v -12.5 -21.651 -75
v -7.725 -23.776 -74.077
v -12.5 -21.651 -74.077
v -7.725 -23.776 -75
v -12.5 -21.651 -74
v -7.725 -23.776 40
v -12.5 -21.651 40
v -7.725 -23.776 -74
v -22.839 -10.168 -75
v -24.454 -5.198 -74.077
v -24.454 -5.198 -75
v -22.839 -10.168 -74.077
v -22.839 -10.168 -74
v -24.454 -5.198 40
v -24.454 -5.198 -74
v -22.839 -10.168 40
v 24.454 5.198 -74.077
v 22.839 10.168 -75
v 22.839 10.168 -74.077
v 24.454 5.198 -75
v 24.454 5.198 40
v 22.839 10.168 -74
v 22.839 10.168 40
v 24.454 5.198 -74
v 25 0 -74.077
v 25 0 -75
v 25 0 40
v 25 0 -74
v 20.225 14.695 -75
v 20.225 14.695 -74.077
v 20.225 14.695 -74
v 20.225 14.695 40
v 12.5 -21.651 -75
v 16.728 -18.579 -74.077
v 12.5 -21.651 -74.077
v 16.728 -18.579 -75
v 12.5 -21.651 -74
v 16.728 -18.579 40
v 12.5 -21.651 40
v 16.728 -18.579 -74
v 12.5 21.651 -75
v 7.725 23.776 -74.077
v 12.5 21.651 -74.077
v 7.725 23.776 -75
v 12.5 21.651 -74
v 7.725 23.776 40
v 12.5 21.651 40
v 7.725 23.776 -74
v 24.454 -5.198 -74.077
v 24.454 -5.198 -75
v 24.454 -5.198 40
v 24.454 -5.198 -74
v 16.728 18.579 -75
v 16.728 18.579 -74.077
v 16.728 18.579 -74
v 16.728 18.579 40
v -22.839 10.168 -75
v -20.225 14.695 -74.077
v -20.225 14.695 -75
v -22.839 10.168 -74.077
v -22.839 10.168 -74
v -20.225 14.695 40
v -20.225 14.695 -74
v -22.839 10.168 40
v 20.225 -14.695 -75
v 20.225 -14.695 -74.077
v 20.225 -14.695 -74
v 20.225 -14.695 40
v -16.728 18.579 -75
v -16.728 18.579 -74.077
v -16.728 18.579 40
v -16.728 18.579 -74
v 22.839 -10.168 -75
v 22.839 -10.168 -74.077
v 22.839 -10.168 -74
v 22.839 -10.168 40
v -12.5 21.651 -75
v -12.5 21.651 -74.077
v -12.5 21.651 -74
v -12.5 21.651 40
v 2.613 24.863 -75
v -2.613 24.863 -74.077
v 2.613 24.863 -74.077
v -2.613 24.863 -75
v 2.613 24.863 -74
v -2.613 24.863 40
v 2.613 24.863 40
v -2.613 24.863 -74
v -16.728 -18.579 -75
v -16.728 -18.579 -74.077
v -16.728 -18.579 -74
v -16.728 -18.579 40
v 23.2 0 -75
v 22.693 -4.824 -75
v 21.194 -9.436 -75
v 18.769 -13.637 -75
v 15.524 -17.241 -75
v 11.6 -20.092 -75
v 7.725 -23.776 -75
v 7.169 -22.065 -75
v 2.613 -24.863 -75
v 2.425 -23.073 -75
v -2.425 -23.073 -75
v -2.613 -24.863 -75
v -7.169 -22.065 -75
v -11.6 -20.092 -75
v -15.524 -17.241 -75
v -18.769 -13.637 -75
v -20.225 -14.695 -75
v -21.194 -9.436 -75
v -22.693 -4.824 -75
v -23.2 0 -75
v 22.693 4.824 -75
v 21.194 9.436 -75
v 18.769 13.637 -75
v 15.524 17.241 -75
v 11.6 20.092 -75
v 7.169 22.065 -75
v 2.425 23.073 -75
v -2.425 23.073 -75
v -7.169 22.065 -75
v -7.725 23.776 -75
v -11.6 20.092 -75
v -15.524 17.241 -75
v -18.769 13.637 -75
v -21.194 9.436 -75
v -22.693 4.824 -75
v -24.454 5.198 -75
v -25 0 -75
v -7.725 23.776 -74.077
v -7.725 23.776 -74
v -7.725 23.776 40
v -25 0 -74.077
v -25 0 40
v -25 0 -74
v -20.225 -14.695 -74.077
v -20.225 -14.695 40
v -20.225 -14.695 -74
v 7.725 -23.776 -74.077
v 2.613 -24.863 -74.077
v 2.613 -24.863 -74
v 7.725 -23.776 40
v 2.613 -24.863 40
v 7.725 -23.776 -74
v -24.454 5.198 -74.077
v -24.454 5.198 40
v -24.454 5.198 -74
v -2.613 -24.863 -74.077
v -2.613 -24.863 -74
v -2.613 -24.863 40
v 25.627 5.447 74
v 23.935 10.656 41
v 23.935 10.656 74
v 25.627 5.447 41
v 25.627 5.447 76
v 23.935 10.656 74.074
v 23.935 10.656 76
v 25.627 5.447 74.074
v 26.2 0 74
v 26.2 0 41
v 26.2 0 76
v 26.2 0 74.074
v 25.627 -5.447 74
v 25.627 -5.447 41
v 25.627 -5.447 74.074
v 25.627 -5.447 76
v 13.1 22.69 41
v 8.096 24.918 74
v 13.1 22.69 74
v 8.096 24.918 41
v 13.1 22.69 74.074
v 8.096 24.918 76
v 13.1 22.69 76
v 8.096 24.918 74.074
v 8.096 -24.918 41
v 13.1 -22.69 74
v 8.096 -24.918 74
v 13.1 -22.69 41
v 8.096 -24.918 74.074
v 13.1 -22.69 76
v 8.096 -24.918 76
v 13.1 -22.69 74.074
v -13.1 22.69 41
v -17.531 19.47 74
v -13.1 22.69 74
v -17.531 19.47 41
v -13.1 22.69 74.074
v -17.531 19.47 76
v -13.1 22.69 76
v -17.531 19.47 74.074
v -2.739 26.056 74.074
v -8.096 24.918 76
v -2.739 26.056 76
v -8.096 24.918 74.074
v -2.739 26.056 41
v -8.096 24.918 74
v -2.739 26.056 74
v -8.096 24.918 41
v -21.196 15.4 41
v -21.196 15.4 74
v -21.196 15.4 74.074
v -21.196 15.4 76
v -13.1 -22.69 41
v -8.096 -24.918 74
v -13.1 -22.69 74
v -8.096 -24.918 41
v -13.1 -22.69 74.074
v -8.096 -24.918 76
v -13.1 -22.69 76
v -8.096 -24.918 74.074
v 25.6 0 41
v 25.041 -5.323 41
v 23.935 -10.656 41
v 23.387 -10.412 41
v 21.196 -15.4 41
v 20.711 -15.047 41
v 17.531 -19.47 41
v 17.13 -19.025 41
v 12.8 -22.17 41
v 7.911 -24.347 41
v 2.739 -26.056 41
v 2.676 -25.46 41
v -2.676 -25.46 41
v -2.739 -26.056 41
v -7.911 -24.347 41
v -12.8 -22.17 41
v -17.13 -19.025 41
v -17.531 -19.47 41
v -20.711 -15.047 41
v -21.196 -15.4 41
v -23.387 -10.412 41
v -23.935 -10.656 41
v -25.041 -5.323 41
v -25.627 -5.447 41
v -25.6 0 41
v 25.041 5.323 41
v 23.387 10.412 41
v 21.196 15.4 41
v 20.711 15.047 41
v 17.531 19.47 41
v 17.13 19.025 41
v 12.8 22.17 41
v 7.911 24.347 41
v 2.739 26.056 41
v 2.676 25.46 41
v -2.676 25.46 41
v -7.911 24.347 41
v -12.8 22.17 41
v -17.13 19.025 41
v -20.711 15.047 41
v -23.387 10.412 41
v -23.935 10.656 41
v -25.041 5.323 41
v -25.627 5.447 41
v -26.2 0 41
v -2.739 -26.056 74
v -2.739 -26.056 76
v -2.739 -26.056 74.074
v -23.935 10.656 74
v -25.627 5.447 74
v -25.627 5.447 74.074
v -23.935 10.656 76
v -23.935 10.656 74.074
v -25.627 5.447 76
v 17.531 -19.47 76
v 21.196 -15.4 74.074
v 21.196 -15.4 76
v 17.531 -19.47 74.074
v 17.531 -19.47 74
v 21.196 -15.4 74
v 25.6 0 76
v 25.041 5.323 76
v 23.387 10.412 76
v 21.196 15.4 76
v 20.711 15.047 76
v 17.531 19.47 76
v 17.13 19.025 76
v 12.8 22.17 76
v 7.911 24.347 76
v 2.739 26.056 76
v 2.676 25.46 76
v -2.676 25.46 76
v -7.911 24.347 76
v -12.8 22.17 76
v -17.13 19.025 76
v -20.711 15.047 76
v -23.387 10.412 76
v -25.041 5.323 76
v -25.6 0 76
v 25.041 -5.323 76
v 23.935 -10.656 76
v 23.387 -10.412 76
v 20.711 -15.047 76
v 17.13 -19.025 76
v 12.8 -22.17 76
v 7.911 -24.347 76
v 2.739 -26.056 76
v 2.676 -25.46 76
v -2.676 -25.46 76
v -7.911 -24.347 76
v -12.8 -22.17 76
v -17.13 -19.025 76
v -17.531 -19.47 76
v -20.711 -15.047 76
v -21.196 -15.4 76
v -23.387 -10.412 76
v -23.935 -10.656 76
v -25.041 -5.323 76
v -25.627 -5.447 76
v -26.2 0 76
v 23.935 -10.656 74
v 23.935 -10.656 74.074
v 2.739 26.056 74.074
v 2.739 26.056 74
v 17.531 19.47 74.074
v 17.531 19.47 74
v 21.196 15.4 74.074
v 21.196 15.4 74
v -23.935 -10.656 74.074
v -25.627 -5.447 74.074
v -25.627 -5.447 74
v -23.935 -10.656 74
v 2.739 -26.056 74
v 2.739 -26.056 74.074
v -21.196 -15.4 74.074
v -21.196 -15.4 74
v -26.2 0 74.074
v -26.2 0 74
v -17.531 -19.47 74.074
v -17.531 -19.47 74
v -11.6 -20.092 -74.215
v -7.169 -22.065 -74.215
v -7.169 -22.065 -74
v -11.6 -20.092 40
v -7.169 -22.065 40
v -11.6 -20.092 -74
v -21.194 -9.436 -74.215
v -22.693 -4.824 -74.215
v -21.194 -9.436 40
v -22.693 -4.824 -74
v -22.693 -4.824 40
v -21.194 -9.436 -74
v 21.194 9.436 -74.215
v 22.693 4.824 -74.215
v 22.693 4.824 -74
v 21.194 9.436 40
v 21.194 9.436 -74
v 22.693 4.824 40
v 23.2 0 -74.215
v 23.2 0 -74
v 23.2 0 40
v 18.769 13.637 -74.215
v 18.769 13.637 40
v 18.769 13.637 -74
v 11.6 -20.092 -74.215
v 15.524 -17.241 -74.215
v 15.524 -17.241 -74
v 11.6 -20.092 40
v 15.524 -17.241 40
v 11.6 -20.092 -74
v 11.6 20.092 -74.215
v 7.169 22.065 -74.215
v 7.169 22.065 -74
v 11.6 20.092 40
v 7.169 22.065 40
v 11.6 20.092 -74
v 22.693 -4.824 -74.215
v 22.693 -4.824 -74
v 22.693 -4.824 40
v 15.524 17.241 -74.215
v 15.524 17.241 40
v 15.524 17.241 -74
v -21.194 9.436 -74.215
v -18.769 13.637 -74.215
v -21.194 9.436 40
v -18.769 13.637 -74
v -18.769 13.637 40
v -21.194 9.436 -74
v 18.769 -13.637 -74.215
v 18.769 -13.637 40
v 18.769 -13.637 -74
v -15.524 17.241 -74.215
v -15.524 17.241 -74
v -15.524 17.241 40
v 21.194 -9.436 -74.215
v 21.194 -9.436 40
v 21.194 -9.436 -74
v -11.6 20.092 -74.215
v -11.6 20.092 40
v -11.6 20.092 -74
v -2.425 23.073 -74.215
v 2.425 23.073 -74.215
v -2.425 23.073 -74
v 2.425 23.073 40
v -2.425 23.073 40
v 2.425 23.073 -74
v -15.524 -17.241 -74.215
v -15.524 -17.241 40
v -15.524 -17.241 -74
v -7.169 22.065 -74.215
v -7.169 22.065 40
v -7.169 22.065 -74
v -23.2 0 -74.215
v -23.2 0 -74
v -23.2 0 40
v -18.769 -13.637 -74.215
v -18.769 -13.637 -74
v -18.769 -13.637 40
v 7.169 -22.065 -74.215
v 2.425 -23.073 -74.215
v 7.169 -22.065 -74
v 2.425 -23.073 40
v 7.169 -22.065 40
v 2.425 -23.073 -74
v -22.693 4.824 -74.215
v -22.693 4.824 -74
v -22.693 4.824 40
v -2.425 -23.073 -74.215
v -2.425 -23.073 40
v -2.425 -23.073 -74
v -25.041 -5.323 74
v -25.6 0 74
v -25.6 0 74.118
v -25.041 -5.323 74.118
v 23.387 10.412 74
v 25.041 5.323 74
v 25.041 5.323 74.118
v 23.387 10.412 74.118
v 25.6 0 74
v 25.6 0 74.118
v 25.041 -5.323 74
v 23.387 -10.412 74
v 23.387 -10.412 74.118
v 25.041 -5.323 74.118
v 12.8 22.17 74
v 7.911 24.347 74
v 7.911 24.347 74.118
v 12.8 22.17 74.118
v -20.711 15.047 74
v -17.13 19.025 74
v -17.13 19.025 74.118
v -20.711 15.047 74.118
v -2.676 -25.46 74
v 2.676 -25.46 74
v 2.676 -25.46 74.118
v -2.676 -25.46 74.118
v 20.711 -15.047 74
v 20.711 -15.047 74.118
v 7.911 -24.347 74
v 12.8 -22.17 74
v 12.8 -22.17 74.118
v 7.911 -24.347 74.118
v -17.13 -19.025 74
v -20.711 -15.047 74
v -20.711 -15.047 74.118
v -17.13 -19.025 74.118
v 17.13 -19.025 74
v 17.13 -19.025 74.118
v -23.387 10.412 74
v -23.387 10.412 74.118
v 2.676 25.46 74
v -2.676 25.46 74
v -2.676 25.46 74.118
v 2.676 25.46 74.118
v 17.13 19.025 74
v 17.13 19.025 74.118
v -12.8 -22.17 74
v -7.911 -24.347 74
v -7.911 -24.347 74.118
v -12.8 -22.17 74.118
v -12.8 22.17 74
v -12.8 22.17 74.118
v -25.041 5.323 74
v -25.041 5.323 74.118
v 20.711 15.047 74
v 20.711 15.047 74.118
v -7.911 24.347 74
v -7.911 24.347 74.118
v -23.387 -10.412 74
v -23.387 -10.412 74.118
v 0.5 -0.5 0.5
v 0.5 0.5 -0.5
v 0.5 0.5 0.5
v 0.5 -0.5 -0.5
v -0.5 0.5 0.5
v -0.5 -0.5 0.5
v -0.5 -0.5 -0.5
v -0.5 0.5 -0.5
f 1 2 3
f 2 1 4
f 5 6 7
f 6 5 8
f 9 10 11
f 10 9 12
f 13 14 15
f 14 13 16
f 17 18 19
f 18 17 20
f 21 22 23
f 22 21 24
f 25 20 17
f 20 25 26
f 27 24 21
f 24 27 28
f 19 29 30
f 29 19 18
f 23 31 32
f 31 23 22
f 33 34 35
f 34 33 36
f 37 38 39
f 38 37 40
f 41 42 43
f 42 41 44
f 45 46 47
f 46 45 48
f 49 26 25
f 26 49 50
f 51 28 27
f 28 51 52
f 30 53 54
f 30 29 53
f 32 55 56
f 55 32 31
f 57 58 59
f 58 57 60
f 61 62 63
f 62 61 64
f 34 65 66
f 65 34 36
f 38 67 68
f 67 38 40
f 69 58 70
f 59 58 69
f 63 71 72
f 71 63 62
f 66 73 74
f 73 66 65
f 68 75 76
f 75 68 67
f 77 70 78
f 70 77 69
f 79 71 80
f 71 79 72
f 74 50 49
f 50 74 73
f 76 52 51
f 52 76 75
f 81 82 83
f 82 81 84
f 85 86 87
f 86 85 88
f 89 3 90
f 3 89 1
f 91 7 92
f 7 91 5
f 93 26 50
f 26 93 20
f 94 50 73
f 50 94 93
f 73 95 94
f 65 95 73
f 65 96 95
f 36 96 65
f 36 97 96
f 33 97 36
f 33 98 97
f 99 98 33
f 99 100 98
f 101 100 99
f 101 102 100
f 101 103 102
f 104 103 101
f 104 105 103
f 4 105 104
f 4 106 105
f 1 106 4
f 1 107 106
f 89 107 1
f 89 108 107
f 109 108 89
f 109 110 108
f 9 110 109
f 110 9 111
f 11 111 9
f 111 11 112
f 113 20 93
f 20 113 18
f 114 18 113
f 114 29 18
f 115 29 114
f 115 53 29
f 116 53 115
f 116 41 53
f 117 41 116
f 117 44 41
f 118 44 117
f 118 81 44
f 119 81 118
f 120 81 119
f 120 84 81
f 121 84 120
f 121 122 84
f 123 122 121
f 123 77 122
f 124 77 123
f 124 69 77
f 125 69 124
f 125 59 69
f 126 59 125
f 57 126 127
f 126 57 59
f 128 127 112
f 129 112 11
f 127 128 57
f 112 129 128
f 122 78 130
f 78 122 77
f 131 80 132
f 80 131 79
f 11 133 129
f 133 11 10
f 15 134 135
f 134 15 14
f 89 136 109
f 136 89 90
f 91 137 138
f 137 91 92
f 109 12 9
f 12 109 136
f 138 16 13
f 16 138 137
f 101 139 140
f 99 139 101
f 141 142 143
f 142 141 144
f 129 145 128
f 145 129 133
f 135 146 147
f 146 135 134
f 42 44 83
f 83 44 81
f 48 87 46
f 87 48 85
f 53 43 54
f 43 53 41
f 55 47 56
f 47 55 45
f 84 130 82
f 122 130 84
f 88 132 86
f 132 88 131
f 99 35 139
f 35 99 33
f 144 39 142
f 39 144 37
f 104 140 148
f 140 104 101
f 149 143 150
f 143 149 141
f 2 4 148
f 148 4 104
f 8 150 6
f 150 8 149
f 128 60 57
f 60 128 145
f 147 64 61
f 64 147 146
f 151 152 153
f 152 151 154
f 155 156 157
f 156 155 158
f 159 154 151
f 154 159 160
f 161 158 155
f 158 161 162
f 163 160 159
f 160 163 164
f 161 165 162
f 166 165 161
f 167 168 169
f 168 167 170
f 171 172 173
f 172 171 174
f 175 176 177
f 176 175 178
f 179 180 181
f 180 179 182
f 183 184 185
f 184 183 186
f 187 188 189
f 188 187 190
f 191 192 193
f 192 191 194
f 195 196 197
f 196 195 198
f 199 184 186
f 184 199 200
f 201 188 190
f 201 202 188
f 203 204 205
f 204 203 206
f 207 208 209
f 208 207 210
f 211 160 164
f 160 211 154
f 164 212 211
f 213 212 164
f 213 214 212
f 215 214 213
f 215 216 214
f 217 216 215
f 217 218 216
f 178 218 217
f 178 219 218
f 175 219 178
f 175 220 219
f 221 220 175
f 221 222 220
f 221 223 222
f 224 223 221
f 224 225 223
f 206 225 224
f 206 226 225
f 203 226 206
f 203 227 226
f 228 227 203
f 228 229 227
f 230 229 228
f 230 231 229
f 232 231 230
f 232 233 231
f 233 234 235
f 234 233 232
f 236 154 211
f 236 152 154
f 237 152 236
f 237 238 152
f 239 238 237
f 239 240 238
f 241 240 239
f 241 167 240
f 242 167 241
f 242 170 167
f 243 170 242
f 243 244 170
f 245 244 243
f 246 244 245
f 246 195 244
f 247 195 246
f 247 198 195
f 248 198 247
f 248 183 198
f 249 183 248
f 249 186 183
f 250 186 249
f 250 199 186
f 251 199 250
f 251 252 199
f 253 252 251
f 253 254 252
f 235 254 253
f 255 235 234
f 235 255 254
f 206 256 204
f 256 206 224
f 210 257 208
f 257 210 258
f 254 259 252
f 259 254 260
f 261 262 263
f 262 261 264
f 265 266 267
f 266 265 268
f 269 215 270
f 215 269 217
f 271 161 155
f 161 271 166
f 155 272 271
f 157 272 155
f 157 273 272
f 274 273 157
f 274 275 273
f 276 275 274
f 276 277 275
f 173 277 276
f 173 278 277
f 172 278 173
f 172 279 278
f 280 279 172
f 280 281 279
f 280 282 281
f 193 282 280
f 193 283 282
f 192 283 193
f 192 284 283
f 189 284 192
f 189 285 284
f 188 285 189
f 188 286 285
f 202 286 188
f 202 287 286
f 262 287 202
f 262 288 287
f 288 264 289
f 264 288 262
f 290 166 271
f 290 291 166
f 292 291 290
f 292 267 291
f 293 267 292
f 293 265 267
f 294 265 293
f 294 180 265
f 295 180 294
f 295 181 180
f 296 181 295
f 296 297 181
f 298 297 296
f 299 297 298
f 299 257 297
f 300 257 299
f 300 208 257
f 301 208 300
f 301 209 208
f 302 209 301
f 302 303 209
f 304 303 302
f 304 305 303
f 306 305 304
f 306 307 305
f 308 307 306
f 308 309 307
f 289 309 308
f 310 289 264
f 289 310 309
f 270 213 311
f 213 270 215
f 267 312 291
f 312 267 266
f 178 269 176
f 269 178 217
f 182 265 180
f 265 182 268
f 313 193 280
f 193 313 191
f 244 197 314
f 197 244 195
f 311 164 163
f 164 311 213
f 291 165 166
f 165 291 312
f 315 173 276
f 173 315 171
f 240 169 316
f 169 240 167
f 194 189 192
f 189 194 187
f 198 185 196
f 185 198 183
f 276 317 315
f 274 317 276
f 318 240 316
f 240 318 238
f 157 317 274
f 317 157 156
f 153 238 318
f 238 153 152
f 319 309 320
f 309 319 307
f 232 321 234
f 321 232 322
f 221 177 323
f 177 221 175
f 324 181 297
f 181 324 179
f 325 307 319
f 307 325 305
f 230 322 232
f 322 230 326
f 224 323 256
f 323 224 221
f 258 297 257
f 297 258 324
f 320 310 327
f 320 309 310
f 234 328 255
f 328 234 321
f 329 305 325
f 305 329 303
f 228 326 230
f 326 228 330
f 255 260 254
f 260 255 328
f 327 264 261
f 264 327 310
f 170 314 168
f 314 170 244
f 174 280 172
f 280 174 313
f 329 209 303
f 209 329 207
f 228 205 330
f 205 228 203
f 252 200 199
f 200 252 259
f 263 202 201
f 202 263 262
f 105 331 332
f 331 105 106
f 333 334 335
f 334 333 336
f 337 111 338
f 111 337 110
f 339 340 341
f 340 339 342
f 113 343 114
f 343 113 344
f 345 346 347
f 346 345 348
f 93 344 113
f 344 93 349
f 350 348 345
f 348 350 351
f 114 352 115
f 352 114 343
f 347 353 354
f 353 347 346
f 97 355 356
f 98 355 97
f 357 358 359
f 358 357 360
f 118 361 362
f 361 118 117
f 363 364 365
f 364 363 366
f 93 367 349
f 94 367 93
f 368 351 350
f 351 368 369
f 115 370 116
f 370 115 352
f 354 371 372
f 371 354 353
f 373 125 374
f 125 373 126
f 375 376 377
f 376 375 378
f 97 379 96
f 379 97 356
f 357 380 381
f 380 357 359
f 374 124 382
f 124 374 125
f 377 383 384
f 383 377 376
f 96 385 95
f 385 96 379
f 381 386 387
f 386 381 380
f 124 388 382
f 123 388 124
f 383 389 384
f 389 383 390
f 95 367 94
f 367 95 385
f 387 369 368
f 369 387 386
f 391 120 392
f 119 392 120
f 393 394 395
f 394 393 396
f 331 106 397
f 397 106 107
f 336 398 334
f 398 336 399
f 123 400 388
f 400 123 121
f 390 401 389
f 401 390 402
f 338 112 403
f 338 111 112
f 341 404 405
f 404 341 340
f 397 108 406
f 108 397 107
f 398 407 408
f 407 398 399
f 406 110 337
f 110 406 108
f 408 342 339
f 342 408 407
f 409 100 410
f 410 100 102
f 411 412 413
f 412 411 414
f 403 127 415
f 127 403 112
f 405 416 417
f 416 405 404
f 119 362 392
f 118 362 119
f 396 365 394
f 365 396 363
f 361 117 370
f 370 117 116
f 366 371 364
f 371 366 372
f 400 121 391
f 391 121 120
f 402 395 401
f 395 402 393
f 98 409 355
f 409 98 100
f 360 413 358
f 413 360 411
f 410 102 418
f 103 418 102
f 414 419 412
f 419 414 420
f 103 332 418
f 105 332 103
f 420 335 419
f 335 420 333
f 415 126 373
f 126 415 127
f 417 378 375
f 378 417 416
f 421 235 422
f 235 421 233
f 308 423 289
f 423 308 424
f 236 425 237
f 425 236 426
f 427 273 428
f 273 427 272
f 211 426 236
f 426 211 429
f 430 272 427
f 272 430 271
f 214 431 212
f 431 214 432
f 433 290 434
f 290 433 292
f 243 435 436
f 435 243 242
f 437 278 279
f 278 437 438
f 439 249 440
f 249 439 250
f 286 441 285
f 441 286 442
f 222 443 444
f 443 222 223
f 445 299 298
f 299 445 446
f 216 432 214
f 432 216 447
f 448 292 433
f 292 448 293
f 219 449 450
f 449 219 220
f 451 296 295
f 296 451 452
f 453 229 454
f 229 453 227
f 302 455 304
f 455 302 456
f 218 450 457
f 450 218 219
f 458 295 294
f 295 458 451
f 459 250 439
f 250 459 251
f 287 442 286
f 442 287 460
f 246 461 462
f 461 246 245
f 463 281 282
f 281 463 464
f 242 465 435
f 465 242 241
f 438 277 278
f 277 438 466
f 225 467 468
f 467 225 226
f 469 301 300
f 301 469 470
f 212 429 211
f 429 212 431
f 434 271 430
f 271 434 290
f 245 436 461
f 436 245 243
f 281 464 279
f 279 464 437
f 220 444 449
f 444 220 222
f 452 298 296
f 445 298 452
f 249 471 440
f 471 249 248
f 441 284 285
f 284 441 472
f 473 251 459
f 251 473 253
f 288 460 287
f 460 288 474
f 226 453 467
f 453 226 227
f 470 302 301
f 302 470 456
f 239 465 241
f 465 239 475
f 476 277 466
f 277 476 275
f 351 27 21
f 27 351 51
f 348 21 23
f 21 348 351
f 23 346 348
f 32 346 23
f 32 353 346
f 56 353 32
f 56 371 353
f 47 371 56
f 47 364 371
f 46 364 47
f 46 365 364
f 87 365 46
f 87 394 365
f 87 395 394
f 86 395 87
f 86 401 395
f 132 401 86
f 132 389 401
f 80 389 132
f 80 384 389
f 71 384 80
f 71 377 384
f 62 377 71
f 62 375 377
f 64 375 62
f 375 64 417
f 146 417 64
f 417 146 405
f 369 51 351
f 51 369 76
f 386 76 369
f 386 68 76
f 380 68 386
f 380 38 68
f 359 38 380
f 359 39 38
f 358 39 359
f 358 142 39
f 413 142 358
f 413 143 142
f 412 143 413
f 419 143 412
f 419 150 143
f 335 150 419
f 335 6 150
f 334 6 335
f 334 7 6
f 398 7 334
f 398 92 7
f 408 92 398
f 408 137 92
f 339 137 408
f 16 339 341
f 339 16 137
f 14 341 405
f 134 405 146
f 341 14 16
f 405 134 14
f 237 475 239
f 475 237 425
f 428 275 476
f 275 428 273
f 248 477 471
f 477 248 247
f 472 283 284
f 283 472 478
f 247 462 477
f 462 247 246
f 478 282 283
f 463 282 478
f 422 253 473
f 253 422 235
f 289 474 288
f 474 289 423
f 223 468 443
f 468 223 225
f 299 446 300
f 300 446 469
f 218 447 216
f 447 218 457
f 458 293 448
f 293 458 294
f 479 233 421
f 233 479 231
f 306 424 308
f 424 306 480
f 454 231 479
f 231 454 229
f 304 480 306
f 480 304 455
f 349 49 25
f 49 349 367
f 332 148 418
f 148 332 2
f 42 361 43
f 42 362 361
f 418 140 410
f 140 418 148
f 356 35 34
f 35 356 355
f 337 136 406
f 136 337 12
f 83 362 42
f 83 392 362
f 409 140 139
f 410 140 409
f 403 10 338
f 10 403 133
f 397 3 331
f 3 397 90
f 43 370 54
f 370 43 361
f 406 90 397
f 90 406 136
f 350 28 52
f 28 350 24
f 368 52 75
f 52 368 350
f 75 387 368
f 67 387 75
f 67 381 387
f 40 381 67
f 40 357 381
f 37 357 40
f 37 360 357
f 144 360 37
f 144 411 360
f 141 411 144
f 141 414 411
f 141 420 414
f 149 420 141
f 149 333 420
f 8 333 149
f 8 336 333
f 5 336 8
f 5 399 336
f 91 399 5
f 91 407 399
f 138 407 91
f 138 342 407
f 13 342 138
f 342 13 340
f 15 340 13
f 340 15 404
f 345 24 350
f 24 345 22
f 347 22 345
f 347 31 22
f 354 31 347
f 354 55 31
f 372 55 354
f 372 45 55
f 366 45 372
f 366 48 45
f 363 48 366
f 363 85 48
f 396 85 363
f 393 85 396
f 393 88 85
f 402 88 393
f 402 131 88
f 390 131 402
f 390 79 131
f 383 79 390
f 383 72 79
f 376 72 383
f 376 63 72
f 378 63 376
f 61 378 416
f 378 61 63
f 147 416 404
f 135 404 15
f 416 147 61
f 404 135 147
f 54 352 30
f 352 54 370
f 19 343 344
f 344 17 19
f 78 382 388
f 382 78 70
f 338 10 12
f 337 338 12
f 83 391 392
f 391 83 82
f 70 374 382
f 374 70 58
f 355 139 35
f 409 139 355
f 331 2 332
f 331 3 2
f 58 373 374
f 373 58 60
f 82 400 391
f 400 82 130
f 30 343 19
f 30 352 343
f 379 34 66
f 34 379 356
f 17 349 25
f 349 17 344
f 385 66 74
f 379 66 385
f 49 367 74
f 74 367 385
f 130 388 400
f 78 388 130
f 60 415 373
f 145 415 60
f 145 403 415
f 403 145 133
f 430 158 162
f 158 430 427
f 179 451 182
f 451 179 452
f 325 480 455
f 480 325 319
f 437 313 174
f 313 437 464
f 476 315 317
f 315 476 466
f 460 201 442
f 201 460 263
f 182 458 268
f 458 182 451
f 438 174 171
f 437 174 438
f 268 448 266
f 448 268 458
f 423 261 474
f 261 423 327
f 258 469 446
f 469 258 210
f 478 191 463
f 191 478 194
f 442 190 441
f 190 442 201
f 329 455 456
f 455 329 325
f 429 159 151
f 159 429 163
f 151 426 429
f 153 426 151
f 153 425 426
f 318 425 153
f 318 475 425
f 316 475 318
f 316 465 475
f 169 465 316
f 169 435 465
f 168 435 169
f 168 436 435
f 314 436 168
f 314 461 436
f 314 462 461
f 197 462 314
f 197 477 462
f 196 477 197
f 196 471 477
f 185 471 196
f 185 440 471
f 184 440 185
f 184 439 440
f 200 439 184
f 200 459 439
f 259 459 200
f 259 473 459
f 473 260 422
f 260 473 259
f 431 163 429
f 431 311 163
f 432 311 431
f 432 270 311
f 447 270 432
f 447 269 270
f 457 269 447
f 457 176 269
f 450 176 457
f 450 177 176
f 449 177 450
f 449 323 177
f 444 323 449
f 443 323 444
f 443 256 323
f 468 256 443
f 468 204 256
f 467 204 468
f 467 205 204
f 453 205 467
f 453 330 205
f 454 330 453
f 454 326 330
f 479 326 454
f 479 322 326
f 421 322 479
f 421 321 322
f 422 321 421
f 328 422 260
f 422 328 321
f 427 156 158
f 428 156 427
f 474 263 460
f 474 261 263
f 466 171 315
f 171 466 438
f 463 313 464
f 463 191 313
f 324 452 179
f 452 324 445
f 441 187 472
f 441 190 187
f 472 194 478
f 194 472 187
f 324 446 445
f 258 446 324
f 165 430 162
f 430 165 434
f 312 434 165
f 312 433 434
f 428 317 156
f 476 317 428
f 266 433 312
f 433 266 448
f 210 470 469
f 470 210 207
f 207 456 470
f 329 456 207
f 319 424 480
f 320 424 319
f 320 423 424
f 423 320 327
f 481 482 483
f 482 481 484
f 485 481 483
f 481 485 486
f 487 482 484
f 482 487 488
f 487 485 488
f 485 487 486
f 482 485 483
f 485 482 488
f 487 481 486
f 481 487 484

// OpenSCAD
// Parameters
outer_diameter = 50; //[25:100:1]
length = 150; //[75:300:1]
wall_thickness = 1.8; //[0.9:3.6:0.1]
socket_length = 35; //[18:70:1]
socket_wall_extra = 1.2; //[0.6:2.4:0.1]
socket_inner_clearance = 0.6; //[0.2:1.2:0.1]
chamfer_length = 2; //[1:6:0.5]
chamfer_radial = 1; //[0.5:3:0.5]
overlap = 1; //[0.5:2:0.5]

// Base Shapes
module pipe_body() {
  translate([0, 0, 0])
    cylinder(h=length, r=outer_diameter/2, center=true);
}

module inner_bore() {
  translate([0, 0, 0])
    cylinder(h=length + 2*overlap, r=outer_diameter/2 - wall_thickness, center=true);
}

module socket_end() {
  translate([0, 0, length/2 - socket_length/2 + overlap])
    cylinder(h=socket_length, r=outer_diameter/2 + socket_wall_extra, center=true);
}

module socket_bore() {
  translate([0, 0, length/2 - socket_length/2 + overlap])
    cylinder(h=socket_length + 2*overlap, r=outer_diameter/2 + socket_inner_clearance, center=true);
}

module end_chamfer_male() {
  translate([0, 0, -length/2 + chamfer_length/2 - overlap])
    rotate([180, 0, 0])
      cylinder(h=chamfer_length, r1=outer_diameter/2 + chamfer_radial, r2=0, center=true);
}

module end_chamfer_socket() {
  translate([0, 0, length/2 - chamfer_length/2 + overlap])
    cylinder(h=chamfer_length, r1=outer_diameter/2 + socket_wall_extra + chamfer_radial, r2=0, center=true);
}

module markings_text() {
  translate([0, 0, 0])
    cube([overlap, overlap, overlap], center=true);
}

// Operations
module pipe_outer_with_socket() {
  union() {
    pipe_body();
    socket_end();
  }
}

module pipe_hollowed() {
  difference() {
    pipe_outer_with_socket();
    inner_bore();
    socket_bore();
  }
}

module pipe_with_end_chamfers() {
  difference() {
    pipe_hollowed();
    end_chamfer_male();
    end_chamfer_socket();
  }
}

module final_model() {
  union() {
    pipe_with_end_chamfers();
    markings_text();
  }
}

// Final Output
final_model();
